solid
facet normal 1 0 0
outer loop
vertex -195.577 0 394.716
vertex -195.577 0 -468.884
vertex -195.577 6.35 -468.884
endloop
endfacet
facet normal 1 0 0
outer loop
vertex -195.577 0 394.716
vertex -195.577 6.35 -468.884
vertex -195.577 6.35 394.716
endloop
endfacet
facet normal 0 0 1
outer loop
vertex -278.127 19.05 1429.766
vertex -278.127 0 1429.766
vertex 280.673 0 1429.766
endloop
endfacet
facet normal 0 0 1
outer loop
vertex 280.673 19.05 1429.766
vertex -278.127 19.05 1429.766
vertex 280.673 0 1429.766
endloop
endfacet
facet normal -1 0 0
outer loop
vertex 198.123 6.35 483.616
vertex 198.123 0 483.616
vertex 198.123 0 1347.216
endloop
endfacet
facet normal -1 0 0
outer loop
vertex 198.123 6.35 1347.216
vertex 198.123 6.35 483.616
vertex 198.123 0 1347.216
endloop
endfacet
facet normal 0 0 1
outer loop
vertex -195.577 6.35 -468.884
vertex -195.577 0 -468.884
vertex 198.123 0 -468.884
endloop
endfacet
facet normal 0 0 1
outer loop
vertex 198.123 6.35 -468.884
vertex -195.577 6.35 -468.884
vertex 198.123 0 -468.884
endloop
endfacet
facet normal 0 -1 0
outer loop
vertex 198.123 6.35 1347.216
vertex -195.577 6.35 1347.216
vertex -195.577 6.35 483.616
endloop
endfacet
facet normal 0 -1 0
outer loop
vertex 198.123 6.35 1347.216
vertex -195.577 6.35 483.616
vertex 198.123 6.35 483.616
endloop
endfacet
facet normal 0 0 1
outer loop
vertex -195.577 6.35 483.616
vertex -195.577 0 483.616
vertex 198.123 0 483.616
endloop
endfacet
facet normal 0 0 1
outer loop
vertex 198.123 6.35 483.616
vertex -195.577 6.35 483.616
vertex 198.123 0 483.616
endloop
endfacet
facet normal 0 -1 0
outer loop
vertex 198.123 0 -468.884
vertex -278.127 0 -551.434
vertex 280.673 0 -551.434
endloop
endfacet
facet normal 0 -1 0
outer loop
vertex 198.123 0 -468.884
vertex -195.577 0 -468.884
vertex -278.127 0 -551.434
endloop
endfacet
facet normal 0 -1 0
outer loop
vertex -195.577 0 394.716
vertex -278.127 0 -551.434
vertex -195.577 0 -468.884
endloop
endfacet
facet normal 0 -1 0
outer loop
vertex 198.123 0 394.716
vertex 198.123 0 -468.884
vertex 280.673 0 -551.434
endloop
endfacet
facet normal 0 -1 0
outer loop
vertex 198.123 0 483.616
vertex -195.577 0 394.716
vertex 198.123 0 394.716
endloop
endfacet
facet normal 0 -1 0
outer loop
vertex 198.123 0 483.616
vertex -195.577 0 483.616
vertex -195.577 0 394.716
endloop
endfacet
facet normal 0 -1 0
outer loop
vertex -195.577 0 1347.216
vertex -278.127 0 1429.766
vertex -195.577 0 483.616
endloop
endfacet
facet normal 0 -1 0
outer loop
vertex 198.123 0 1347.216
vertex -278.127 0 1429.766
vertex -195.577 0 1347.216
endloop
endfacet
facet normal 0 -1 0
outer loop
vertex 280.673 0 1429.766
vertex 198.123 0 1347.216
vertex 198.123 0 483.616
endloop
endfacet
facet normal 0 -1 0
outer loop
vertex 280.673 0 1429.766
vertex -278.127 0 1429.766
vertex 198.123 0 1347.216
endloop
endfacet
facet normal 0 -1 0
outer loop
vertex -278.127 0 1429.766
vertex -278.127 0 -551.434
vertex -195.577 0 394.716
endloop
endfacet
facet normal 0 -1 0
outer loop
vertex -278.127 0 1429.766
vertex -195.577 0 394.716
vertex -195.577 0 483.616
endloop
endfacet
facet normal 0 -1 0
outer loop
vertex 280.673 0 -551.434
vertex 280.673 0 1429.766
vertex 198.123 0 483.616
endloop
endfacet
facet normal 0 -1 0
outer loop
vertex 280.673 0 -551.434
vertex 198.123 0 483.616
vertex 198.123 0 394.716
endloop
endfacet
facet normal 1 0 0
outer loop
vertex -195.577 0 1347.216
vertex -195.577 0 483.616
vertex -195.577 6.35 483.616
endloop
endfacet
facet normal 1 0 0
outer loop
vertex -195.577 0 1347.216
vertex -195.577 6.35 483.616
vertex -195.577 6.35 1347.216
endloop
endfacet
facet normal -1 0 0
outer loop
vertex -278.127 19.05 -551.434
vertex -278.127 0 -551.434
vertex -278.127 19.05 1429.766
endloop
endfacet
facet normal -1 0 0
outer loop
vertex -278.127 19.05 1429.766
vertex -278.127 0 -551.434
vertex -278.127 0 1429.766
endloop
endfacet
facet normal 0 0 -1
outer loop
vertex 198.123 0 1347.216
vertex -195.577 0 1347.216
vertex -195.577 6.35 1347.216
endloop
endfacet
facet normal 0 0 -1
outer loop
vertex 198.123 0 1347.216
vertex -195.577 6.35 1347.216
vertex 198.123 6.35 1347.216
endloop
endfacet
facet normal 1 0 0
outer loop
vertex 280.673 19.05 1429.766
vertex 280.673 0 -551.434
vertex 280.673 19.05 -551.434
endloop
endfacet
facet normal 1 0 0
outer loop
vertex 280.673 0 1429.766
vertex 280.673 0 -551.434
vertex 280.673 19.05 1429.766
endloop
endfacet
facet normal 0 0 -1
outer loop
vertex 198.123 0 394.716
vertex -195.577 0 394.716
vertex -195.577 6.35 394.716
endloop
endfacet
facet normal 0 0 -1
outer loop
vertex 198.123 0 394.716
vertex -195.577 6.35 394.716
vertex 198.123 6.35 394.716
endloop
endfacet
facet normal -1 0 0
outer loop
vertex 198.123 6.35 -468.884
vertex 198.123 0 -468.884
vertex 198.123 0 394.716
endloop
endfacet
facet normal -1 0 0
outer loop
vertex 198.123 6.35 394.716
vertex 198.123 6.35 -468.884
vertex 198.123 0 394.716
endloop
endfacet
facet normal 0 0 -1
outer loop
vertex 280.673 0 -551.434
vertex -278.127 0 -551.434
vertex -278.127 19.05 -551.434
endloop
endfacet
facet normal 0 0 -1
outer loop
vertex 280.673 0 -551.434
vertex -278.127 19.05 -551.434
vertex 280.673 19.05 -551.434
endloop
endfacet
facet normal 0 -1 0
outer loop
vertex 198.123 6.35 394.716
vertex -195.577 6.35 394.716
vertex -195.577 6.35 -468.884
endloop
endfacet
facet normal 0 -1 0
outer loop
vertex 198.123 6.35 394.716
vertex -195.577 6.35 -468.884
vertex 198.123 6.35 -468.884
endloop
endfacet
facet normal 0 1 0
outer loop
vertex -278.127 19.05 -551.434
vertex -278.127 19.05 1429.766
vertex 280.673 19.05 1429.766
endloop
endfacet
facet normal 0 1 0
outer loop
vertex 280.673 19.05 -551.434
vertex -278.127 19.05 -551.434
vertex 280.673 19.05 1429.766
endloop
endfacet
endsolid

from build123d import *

# Parameters (mm, degrees)
F0_W     = 558.8
F0_H     = 1981.2
F1_DEPTH = 19.05
F2_W     = 393.7
F2_H     = 863.6
F3_DEPTH = 6.35


with BuildPart() as f1:
    # F0 (on Front) → F1 (new body)
    with BuildSketch(Plane.XZ):
        with Locations((1.273108, 439.16639)):
            Rectangle(F0_W, F0_H)
    extrude(amount=-F1_DEPTH)

    # F2 (on face) → F3 (cut)
    with BuildSketch(Plane.XZ):
        with Locations((1.273108, 915.41639)):
            Rectangle(F2_W, F2_H)
        with Locations((1.273108, -37.08361)):
            Rectangle(F2_W, F2_H)
    extrude(amount=-F3_DEPTH, mode=Mode.SUBTRACT)


solid = f1.part
